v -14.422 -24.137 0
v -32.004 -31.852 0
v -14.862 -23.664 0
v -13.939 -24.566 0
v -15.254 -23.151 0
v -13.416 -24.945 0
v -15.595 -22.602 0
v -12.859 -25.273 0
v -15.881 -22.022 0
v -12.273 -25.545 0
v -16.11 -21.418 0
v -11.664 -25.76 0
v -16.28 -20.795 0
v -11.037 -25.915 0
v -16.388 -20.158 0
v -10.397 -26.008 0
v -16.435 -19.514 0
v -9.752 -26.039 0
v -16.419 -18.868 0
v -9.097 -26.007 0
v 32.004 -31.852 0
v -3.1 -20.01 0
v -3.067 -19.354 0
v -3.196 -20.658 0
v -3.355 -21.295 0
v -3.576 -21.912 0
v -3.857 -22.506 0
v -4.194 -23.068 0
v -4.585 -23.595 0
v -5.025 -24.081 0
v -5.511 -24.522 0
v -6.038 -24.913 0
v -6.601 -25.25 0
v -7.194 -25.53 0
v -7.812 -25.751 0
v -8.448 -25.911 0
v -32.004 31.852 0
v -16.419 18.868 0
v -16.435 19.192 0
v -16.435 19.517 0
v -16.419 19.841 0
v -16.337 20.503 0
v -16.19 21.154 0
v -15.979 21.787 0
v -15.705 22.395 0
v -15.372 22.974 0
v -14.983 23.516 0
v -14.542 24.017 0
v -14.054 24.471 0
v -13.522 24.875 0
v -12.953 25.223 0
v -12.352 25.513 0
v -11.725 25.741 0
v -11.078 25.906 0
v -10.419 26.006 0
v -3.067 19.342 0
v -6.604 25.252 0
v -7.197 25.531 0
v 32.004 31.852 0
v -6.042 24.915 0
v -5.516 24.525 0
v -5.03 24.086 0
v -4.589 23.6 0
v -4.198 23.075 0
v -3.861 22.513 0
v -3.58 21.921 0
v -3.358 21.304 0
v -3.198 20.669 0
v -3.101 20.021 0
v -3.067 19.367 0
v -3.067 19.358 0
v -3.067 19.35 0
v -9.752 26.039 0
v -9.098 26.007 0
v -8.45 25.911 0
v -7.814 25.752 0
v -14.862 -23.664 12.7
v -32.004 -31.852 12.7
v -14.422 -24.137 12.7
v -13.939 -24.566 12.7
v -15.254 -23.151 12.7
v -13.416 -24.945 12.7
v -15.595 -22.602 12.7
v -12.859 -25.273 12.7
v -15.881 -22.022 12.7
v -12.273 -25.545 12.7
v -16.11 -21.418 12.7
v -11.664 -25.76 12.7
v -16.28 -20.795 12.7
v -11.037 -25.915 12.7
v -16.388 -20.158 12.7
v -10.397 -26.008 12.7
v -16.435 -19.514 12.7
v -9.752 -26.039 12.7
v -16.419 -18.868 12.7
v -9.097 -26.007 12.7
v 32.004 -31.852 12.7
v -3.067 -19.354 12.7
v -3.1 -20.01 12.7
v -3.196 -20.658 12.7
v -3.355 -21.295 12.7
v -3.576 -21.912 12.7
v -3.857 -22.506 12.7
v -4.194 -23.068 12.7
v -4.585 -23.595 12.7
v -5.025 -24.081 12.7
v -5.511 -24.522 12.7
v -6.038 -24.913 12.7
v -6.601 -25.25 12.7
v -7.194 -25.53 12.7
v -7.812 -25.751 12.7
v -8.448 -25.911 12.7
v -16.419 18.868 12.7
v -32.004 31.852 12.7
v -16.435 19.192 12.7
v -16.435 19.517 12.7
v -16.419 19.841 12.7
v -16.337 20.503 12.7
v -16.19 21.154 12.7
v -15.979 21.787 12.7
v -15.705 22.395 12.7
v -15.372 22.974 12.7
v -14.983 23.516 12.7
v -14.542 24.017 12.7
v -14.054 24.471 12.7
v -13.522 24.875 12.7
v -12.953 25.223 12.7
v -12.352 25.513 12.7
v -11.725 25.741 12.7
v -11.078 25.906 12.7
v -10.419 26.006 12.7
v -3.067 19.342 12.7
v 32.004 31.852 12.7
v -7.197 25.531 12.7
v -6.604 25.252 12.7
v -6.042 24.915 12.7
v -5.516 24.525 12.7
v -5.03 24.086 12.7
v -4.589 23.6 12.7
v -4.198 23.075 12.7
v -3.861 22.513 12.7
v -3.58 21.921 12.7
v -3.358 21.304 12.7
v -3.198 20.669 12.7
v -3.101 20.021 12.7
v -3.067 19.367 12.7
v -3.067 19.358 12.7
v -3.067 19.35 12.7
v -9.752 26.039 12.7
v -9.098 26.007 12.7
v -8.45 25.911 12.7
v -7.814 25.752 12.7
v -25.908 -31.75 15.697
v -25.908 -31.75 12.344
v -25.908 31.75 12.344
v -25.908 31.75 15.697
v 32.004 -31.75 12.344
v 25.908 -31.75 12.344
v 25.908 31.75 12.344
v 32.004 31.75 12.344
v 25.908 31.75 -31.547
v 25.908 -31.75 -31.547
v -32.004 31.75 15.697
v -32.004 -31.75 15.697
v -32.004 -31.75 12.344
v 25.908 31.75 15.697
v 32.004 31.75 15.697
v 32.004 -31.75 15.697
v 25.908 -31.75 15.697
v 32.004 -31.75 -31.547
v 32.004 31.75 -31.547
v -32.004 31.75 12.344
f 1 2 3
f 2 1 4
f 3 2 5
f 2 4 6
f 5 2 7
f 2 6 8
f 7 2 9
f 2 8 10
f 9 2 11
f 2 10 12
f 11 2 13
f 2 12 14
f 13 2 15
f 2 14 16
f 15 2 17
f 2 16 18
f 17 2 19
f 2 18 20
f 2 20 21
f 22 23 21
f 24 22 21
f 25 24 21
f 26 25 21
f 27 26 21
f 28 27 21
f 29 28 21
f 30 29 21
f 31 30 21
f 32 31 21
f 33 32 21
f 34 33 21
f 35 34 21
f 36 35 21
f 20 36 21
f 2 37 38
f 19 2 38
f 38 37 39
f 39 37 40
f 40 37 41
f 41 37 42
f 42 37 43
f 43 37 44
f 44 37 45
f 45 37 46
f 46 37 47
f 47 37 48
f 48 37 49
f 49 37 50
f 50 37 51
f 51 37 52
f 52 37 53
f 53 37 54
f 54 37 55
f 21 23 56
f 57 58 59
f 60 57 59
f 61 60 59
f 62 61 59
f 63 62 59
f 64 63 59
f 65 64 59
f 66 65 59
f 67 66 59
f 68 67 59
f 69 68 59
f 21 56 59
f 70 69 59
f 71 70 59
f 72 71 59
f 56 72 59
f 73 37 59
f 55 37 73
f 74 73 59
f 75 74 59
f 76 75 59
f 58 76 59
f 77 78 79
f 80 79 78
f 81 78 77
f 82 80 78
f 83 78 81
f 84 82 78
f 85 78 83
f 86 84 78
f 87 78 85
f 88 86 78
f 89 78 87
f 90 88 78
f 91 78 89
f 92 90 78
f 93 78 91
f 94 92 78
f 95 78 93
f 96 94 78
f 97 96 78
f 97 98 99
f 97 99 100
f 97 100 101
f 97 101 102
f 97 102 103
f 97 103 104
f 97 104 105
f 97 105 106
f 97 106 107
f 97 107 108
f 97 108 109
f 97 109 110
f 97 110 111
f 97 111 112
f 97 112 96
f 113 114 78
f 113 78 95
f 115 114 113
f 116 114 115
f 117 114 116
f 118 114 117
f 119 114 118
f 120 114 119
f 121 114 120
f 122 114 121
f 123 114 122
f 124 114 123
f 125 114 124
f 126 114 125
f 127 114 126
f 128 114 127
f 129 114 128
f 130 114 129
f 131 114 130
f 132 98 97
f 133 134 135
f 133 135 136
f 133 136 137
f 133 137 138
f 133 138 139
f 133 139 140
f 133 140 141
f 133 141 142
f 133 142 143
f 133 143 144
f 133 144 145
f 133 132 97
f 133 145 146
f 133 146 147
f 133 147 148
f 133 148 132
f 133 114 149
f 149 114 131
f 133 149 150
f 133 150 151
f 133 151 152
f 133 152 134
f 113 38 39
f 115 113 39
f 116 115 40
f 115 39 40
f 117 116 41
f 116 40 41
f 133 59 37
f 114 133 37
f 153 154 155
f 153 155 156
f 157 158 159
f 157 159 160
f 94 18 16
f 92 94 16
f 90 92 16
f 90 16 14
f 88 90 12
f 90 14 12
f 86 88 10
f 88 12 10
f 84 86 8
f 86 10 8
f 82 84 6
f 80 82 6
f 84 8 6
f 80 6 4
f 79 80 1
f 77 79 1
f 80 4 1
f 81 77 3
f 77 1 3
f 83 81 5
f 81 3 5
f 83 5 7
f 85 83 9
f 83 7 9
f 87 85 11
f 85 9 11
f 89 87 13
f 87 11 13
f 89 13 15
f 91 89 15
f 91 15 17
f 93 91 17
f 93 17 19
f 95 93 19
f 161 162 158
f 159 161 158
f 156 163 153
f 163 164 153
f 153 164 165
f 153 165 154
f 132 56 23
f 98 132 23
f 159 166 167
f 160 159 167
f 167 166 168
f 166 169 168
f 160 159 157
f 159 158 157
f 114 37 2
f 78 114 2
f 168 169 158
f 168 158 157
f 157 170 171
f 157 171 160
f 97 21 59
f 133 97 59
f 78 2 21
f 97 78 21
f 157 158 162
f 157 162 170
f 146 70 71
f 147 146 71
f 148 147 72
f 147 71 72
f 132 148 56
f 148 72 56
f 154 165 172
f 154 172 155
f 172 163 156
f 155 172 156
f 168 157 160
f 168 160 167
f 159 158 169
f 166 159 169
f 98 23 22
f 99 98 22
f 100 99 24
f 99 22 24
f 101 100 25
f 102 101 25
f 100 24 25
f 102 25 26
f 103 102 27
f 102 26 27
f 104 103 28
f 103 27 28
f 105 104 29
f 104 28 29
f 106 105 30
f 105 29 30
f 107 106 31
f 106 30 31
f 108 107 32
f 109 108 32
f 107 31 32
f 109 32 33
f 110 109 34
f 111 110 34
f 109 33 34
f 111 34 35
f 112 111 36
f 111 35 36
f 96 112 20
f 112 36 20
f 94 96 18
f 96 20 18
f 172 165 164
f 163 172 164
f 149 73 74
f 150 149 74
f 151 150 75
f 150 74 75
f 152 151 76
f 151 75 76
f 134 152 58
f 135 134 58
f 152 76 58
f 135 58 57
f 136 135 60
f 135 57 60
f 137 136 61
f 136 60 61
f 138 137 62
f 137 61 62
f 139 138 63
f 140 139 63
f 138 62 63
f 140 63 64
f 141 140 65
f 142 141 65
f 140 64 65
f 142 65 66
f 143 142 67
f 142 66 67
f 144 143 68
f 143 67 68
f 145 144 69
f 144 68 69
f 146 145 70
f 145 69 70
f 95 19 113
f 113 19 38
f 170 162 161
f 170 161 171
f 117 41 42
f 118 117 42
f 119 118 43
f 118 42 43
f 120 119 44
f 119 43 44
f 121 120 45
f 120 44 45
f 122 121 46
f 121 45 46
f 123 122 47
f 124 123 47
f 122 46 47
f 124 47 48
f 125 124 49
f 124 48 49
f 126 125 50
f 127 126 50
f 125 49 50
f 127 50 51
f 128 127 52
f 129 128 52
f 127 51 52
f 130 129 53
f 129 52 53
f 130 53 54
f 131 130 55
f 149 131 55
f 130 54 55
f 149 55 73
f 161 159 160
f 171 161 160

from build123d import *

# Parameters (mm, degrees)
F1_DEPTH      = 12.7
F2_W          = 6.095566
F2_H          = 3.35368
F3_DEPTH      = 31.75
F3_DEPTH_BACK = 31.75
F4_DEPTH      = 31.75
F4_DEPTH_BACK = 31.75
F2_H_2        = 43.890321
F5_DEPTH      = 31.75
F5_DEPTH_BACK = 31.75


with BuildPart() as f1:
    # F0 (on Top) → F1 (new body)
    with BuildSketch(Plane.XY):
        with BuildLine():
            Line((-9.752161, 31.851601), (-32.003999, 31.851601))
            Line((-32.003999, 31.851601), (-32.003999, -31.851601))
            Line((-32.003999, -31.851601), (-9.752161, -31.851601))
            Line((-9.752161, -31.851601), (-9.752161, -26.039103))
            ThreePointArc((-9.752161, -26.039103), (-14.648011, -23.905912), (-16.419219, -18.867789))
            Line((-16.419219, -18.867789), (-16.419219, 18.867789))
            ThreePointArc((-16.419219, 18.867789), (-16.436948, 19.354316), (-16.419219, 19.840844))
            ThreePointArc((-16.419219, 19.840844), (-14.303756, 24.250167), (-9.752161, 26.039103))
            Line((-9.752161, 26.039103), (-9.752161, 31.851601))
        make_face()
        with BuildLine():
            Line((32.003999, 31.851601), (-9.752161, 31.851601))
            Line((-9.752161, 31.851601), (-9.752161, 26.039103))
            ThreePointArc((-9.752161, 26.039103), (-5.02968, 24.085548), (-3.067385, 19.366693))
            ThreePointArc((-3.067385, 19.366693), (-3.067373, 19.354318), (-3.067385, 19.341944))
            Line((-3.067385, 19.341944), (-3.067373, -19.354314))
            ThreePointArc((-3.067373, -19.354314), (-5.025302, -24.081174), (-9.752161, -26.039103))
            Line((-9.752161, -26.039103), (-9.752161, -31.851601))
            Line((-9.752161, -31.851601), (32.003999, -31.851601))
            Line((32.003999, -31.851601), (32.003999, 31.851601))
        make_face()
    extrude(amount=F1_DEPTH)


with BuildPart() as f3:
    # F2 (on Front) → F3 (new body, two sides)
    with BuildSketch(Plane.XZ) as f3_sk:
        with Locations((28.95578, 14.02036)):
            Rectangle(F2_W, F2_H)
    extrude(amount=F3_DEPTH)
    extrude(f3_sk.sketch, amount=-F3_DEPTH_BACK)


with BuildPart() as f4:
    # F2 (on Front) → F4 (new body, two sides)
    with BuildSketch(Plane.XZ) as f4_sk:
        with Locations((-28.95578, 14.02036)):
            Rectangle(F2_W, F2_H)
    extrude(amount=F4_DEPTH)
    extrude(f4_sk.sketch, amount=-F4_DEPTH_BACK)


with BuildPart() as f5:
    # F2 (on Front) → F5 (new body, two sides)
    with BuildSketch(Plane.XZ) as f5_sk:
        with Locations((28.95578, -9.60164)):
            Rectangle(F2_W, F2_H_2)
    extrude(amount=F5_DEPTH)
    extrude(f5_sk.sketch, amount=-F5_DEPTH_BACK)


solid = Compound([f1.part, f3.part, f4.part, f5.part])
